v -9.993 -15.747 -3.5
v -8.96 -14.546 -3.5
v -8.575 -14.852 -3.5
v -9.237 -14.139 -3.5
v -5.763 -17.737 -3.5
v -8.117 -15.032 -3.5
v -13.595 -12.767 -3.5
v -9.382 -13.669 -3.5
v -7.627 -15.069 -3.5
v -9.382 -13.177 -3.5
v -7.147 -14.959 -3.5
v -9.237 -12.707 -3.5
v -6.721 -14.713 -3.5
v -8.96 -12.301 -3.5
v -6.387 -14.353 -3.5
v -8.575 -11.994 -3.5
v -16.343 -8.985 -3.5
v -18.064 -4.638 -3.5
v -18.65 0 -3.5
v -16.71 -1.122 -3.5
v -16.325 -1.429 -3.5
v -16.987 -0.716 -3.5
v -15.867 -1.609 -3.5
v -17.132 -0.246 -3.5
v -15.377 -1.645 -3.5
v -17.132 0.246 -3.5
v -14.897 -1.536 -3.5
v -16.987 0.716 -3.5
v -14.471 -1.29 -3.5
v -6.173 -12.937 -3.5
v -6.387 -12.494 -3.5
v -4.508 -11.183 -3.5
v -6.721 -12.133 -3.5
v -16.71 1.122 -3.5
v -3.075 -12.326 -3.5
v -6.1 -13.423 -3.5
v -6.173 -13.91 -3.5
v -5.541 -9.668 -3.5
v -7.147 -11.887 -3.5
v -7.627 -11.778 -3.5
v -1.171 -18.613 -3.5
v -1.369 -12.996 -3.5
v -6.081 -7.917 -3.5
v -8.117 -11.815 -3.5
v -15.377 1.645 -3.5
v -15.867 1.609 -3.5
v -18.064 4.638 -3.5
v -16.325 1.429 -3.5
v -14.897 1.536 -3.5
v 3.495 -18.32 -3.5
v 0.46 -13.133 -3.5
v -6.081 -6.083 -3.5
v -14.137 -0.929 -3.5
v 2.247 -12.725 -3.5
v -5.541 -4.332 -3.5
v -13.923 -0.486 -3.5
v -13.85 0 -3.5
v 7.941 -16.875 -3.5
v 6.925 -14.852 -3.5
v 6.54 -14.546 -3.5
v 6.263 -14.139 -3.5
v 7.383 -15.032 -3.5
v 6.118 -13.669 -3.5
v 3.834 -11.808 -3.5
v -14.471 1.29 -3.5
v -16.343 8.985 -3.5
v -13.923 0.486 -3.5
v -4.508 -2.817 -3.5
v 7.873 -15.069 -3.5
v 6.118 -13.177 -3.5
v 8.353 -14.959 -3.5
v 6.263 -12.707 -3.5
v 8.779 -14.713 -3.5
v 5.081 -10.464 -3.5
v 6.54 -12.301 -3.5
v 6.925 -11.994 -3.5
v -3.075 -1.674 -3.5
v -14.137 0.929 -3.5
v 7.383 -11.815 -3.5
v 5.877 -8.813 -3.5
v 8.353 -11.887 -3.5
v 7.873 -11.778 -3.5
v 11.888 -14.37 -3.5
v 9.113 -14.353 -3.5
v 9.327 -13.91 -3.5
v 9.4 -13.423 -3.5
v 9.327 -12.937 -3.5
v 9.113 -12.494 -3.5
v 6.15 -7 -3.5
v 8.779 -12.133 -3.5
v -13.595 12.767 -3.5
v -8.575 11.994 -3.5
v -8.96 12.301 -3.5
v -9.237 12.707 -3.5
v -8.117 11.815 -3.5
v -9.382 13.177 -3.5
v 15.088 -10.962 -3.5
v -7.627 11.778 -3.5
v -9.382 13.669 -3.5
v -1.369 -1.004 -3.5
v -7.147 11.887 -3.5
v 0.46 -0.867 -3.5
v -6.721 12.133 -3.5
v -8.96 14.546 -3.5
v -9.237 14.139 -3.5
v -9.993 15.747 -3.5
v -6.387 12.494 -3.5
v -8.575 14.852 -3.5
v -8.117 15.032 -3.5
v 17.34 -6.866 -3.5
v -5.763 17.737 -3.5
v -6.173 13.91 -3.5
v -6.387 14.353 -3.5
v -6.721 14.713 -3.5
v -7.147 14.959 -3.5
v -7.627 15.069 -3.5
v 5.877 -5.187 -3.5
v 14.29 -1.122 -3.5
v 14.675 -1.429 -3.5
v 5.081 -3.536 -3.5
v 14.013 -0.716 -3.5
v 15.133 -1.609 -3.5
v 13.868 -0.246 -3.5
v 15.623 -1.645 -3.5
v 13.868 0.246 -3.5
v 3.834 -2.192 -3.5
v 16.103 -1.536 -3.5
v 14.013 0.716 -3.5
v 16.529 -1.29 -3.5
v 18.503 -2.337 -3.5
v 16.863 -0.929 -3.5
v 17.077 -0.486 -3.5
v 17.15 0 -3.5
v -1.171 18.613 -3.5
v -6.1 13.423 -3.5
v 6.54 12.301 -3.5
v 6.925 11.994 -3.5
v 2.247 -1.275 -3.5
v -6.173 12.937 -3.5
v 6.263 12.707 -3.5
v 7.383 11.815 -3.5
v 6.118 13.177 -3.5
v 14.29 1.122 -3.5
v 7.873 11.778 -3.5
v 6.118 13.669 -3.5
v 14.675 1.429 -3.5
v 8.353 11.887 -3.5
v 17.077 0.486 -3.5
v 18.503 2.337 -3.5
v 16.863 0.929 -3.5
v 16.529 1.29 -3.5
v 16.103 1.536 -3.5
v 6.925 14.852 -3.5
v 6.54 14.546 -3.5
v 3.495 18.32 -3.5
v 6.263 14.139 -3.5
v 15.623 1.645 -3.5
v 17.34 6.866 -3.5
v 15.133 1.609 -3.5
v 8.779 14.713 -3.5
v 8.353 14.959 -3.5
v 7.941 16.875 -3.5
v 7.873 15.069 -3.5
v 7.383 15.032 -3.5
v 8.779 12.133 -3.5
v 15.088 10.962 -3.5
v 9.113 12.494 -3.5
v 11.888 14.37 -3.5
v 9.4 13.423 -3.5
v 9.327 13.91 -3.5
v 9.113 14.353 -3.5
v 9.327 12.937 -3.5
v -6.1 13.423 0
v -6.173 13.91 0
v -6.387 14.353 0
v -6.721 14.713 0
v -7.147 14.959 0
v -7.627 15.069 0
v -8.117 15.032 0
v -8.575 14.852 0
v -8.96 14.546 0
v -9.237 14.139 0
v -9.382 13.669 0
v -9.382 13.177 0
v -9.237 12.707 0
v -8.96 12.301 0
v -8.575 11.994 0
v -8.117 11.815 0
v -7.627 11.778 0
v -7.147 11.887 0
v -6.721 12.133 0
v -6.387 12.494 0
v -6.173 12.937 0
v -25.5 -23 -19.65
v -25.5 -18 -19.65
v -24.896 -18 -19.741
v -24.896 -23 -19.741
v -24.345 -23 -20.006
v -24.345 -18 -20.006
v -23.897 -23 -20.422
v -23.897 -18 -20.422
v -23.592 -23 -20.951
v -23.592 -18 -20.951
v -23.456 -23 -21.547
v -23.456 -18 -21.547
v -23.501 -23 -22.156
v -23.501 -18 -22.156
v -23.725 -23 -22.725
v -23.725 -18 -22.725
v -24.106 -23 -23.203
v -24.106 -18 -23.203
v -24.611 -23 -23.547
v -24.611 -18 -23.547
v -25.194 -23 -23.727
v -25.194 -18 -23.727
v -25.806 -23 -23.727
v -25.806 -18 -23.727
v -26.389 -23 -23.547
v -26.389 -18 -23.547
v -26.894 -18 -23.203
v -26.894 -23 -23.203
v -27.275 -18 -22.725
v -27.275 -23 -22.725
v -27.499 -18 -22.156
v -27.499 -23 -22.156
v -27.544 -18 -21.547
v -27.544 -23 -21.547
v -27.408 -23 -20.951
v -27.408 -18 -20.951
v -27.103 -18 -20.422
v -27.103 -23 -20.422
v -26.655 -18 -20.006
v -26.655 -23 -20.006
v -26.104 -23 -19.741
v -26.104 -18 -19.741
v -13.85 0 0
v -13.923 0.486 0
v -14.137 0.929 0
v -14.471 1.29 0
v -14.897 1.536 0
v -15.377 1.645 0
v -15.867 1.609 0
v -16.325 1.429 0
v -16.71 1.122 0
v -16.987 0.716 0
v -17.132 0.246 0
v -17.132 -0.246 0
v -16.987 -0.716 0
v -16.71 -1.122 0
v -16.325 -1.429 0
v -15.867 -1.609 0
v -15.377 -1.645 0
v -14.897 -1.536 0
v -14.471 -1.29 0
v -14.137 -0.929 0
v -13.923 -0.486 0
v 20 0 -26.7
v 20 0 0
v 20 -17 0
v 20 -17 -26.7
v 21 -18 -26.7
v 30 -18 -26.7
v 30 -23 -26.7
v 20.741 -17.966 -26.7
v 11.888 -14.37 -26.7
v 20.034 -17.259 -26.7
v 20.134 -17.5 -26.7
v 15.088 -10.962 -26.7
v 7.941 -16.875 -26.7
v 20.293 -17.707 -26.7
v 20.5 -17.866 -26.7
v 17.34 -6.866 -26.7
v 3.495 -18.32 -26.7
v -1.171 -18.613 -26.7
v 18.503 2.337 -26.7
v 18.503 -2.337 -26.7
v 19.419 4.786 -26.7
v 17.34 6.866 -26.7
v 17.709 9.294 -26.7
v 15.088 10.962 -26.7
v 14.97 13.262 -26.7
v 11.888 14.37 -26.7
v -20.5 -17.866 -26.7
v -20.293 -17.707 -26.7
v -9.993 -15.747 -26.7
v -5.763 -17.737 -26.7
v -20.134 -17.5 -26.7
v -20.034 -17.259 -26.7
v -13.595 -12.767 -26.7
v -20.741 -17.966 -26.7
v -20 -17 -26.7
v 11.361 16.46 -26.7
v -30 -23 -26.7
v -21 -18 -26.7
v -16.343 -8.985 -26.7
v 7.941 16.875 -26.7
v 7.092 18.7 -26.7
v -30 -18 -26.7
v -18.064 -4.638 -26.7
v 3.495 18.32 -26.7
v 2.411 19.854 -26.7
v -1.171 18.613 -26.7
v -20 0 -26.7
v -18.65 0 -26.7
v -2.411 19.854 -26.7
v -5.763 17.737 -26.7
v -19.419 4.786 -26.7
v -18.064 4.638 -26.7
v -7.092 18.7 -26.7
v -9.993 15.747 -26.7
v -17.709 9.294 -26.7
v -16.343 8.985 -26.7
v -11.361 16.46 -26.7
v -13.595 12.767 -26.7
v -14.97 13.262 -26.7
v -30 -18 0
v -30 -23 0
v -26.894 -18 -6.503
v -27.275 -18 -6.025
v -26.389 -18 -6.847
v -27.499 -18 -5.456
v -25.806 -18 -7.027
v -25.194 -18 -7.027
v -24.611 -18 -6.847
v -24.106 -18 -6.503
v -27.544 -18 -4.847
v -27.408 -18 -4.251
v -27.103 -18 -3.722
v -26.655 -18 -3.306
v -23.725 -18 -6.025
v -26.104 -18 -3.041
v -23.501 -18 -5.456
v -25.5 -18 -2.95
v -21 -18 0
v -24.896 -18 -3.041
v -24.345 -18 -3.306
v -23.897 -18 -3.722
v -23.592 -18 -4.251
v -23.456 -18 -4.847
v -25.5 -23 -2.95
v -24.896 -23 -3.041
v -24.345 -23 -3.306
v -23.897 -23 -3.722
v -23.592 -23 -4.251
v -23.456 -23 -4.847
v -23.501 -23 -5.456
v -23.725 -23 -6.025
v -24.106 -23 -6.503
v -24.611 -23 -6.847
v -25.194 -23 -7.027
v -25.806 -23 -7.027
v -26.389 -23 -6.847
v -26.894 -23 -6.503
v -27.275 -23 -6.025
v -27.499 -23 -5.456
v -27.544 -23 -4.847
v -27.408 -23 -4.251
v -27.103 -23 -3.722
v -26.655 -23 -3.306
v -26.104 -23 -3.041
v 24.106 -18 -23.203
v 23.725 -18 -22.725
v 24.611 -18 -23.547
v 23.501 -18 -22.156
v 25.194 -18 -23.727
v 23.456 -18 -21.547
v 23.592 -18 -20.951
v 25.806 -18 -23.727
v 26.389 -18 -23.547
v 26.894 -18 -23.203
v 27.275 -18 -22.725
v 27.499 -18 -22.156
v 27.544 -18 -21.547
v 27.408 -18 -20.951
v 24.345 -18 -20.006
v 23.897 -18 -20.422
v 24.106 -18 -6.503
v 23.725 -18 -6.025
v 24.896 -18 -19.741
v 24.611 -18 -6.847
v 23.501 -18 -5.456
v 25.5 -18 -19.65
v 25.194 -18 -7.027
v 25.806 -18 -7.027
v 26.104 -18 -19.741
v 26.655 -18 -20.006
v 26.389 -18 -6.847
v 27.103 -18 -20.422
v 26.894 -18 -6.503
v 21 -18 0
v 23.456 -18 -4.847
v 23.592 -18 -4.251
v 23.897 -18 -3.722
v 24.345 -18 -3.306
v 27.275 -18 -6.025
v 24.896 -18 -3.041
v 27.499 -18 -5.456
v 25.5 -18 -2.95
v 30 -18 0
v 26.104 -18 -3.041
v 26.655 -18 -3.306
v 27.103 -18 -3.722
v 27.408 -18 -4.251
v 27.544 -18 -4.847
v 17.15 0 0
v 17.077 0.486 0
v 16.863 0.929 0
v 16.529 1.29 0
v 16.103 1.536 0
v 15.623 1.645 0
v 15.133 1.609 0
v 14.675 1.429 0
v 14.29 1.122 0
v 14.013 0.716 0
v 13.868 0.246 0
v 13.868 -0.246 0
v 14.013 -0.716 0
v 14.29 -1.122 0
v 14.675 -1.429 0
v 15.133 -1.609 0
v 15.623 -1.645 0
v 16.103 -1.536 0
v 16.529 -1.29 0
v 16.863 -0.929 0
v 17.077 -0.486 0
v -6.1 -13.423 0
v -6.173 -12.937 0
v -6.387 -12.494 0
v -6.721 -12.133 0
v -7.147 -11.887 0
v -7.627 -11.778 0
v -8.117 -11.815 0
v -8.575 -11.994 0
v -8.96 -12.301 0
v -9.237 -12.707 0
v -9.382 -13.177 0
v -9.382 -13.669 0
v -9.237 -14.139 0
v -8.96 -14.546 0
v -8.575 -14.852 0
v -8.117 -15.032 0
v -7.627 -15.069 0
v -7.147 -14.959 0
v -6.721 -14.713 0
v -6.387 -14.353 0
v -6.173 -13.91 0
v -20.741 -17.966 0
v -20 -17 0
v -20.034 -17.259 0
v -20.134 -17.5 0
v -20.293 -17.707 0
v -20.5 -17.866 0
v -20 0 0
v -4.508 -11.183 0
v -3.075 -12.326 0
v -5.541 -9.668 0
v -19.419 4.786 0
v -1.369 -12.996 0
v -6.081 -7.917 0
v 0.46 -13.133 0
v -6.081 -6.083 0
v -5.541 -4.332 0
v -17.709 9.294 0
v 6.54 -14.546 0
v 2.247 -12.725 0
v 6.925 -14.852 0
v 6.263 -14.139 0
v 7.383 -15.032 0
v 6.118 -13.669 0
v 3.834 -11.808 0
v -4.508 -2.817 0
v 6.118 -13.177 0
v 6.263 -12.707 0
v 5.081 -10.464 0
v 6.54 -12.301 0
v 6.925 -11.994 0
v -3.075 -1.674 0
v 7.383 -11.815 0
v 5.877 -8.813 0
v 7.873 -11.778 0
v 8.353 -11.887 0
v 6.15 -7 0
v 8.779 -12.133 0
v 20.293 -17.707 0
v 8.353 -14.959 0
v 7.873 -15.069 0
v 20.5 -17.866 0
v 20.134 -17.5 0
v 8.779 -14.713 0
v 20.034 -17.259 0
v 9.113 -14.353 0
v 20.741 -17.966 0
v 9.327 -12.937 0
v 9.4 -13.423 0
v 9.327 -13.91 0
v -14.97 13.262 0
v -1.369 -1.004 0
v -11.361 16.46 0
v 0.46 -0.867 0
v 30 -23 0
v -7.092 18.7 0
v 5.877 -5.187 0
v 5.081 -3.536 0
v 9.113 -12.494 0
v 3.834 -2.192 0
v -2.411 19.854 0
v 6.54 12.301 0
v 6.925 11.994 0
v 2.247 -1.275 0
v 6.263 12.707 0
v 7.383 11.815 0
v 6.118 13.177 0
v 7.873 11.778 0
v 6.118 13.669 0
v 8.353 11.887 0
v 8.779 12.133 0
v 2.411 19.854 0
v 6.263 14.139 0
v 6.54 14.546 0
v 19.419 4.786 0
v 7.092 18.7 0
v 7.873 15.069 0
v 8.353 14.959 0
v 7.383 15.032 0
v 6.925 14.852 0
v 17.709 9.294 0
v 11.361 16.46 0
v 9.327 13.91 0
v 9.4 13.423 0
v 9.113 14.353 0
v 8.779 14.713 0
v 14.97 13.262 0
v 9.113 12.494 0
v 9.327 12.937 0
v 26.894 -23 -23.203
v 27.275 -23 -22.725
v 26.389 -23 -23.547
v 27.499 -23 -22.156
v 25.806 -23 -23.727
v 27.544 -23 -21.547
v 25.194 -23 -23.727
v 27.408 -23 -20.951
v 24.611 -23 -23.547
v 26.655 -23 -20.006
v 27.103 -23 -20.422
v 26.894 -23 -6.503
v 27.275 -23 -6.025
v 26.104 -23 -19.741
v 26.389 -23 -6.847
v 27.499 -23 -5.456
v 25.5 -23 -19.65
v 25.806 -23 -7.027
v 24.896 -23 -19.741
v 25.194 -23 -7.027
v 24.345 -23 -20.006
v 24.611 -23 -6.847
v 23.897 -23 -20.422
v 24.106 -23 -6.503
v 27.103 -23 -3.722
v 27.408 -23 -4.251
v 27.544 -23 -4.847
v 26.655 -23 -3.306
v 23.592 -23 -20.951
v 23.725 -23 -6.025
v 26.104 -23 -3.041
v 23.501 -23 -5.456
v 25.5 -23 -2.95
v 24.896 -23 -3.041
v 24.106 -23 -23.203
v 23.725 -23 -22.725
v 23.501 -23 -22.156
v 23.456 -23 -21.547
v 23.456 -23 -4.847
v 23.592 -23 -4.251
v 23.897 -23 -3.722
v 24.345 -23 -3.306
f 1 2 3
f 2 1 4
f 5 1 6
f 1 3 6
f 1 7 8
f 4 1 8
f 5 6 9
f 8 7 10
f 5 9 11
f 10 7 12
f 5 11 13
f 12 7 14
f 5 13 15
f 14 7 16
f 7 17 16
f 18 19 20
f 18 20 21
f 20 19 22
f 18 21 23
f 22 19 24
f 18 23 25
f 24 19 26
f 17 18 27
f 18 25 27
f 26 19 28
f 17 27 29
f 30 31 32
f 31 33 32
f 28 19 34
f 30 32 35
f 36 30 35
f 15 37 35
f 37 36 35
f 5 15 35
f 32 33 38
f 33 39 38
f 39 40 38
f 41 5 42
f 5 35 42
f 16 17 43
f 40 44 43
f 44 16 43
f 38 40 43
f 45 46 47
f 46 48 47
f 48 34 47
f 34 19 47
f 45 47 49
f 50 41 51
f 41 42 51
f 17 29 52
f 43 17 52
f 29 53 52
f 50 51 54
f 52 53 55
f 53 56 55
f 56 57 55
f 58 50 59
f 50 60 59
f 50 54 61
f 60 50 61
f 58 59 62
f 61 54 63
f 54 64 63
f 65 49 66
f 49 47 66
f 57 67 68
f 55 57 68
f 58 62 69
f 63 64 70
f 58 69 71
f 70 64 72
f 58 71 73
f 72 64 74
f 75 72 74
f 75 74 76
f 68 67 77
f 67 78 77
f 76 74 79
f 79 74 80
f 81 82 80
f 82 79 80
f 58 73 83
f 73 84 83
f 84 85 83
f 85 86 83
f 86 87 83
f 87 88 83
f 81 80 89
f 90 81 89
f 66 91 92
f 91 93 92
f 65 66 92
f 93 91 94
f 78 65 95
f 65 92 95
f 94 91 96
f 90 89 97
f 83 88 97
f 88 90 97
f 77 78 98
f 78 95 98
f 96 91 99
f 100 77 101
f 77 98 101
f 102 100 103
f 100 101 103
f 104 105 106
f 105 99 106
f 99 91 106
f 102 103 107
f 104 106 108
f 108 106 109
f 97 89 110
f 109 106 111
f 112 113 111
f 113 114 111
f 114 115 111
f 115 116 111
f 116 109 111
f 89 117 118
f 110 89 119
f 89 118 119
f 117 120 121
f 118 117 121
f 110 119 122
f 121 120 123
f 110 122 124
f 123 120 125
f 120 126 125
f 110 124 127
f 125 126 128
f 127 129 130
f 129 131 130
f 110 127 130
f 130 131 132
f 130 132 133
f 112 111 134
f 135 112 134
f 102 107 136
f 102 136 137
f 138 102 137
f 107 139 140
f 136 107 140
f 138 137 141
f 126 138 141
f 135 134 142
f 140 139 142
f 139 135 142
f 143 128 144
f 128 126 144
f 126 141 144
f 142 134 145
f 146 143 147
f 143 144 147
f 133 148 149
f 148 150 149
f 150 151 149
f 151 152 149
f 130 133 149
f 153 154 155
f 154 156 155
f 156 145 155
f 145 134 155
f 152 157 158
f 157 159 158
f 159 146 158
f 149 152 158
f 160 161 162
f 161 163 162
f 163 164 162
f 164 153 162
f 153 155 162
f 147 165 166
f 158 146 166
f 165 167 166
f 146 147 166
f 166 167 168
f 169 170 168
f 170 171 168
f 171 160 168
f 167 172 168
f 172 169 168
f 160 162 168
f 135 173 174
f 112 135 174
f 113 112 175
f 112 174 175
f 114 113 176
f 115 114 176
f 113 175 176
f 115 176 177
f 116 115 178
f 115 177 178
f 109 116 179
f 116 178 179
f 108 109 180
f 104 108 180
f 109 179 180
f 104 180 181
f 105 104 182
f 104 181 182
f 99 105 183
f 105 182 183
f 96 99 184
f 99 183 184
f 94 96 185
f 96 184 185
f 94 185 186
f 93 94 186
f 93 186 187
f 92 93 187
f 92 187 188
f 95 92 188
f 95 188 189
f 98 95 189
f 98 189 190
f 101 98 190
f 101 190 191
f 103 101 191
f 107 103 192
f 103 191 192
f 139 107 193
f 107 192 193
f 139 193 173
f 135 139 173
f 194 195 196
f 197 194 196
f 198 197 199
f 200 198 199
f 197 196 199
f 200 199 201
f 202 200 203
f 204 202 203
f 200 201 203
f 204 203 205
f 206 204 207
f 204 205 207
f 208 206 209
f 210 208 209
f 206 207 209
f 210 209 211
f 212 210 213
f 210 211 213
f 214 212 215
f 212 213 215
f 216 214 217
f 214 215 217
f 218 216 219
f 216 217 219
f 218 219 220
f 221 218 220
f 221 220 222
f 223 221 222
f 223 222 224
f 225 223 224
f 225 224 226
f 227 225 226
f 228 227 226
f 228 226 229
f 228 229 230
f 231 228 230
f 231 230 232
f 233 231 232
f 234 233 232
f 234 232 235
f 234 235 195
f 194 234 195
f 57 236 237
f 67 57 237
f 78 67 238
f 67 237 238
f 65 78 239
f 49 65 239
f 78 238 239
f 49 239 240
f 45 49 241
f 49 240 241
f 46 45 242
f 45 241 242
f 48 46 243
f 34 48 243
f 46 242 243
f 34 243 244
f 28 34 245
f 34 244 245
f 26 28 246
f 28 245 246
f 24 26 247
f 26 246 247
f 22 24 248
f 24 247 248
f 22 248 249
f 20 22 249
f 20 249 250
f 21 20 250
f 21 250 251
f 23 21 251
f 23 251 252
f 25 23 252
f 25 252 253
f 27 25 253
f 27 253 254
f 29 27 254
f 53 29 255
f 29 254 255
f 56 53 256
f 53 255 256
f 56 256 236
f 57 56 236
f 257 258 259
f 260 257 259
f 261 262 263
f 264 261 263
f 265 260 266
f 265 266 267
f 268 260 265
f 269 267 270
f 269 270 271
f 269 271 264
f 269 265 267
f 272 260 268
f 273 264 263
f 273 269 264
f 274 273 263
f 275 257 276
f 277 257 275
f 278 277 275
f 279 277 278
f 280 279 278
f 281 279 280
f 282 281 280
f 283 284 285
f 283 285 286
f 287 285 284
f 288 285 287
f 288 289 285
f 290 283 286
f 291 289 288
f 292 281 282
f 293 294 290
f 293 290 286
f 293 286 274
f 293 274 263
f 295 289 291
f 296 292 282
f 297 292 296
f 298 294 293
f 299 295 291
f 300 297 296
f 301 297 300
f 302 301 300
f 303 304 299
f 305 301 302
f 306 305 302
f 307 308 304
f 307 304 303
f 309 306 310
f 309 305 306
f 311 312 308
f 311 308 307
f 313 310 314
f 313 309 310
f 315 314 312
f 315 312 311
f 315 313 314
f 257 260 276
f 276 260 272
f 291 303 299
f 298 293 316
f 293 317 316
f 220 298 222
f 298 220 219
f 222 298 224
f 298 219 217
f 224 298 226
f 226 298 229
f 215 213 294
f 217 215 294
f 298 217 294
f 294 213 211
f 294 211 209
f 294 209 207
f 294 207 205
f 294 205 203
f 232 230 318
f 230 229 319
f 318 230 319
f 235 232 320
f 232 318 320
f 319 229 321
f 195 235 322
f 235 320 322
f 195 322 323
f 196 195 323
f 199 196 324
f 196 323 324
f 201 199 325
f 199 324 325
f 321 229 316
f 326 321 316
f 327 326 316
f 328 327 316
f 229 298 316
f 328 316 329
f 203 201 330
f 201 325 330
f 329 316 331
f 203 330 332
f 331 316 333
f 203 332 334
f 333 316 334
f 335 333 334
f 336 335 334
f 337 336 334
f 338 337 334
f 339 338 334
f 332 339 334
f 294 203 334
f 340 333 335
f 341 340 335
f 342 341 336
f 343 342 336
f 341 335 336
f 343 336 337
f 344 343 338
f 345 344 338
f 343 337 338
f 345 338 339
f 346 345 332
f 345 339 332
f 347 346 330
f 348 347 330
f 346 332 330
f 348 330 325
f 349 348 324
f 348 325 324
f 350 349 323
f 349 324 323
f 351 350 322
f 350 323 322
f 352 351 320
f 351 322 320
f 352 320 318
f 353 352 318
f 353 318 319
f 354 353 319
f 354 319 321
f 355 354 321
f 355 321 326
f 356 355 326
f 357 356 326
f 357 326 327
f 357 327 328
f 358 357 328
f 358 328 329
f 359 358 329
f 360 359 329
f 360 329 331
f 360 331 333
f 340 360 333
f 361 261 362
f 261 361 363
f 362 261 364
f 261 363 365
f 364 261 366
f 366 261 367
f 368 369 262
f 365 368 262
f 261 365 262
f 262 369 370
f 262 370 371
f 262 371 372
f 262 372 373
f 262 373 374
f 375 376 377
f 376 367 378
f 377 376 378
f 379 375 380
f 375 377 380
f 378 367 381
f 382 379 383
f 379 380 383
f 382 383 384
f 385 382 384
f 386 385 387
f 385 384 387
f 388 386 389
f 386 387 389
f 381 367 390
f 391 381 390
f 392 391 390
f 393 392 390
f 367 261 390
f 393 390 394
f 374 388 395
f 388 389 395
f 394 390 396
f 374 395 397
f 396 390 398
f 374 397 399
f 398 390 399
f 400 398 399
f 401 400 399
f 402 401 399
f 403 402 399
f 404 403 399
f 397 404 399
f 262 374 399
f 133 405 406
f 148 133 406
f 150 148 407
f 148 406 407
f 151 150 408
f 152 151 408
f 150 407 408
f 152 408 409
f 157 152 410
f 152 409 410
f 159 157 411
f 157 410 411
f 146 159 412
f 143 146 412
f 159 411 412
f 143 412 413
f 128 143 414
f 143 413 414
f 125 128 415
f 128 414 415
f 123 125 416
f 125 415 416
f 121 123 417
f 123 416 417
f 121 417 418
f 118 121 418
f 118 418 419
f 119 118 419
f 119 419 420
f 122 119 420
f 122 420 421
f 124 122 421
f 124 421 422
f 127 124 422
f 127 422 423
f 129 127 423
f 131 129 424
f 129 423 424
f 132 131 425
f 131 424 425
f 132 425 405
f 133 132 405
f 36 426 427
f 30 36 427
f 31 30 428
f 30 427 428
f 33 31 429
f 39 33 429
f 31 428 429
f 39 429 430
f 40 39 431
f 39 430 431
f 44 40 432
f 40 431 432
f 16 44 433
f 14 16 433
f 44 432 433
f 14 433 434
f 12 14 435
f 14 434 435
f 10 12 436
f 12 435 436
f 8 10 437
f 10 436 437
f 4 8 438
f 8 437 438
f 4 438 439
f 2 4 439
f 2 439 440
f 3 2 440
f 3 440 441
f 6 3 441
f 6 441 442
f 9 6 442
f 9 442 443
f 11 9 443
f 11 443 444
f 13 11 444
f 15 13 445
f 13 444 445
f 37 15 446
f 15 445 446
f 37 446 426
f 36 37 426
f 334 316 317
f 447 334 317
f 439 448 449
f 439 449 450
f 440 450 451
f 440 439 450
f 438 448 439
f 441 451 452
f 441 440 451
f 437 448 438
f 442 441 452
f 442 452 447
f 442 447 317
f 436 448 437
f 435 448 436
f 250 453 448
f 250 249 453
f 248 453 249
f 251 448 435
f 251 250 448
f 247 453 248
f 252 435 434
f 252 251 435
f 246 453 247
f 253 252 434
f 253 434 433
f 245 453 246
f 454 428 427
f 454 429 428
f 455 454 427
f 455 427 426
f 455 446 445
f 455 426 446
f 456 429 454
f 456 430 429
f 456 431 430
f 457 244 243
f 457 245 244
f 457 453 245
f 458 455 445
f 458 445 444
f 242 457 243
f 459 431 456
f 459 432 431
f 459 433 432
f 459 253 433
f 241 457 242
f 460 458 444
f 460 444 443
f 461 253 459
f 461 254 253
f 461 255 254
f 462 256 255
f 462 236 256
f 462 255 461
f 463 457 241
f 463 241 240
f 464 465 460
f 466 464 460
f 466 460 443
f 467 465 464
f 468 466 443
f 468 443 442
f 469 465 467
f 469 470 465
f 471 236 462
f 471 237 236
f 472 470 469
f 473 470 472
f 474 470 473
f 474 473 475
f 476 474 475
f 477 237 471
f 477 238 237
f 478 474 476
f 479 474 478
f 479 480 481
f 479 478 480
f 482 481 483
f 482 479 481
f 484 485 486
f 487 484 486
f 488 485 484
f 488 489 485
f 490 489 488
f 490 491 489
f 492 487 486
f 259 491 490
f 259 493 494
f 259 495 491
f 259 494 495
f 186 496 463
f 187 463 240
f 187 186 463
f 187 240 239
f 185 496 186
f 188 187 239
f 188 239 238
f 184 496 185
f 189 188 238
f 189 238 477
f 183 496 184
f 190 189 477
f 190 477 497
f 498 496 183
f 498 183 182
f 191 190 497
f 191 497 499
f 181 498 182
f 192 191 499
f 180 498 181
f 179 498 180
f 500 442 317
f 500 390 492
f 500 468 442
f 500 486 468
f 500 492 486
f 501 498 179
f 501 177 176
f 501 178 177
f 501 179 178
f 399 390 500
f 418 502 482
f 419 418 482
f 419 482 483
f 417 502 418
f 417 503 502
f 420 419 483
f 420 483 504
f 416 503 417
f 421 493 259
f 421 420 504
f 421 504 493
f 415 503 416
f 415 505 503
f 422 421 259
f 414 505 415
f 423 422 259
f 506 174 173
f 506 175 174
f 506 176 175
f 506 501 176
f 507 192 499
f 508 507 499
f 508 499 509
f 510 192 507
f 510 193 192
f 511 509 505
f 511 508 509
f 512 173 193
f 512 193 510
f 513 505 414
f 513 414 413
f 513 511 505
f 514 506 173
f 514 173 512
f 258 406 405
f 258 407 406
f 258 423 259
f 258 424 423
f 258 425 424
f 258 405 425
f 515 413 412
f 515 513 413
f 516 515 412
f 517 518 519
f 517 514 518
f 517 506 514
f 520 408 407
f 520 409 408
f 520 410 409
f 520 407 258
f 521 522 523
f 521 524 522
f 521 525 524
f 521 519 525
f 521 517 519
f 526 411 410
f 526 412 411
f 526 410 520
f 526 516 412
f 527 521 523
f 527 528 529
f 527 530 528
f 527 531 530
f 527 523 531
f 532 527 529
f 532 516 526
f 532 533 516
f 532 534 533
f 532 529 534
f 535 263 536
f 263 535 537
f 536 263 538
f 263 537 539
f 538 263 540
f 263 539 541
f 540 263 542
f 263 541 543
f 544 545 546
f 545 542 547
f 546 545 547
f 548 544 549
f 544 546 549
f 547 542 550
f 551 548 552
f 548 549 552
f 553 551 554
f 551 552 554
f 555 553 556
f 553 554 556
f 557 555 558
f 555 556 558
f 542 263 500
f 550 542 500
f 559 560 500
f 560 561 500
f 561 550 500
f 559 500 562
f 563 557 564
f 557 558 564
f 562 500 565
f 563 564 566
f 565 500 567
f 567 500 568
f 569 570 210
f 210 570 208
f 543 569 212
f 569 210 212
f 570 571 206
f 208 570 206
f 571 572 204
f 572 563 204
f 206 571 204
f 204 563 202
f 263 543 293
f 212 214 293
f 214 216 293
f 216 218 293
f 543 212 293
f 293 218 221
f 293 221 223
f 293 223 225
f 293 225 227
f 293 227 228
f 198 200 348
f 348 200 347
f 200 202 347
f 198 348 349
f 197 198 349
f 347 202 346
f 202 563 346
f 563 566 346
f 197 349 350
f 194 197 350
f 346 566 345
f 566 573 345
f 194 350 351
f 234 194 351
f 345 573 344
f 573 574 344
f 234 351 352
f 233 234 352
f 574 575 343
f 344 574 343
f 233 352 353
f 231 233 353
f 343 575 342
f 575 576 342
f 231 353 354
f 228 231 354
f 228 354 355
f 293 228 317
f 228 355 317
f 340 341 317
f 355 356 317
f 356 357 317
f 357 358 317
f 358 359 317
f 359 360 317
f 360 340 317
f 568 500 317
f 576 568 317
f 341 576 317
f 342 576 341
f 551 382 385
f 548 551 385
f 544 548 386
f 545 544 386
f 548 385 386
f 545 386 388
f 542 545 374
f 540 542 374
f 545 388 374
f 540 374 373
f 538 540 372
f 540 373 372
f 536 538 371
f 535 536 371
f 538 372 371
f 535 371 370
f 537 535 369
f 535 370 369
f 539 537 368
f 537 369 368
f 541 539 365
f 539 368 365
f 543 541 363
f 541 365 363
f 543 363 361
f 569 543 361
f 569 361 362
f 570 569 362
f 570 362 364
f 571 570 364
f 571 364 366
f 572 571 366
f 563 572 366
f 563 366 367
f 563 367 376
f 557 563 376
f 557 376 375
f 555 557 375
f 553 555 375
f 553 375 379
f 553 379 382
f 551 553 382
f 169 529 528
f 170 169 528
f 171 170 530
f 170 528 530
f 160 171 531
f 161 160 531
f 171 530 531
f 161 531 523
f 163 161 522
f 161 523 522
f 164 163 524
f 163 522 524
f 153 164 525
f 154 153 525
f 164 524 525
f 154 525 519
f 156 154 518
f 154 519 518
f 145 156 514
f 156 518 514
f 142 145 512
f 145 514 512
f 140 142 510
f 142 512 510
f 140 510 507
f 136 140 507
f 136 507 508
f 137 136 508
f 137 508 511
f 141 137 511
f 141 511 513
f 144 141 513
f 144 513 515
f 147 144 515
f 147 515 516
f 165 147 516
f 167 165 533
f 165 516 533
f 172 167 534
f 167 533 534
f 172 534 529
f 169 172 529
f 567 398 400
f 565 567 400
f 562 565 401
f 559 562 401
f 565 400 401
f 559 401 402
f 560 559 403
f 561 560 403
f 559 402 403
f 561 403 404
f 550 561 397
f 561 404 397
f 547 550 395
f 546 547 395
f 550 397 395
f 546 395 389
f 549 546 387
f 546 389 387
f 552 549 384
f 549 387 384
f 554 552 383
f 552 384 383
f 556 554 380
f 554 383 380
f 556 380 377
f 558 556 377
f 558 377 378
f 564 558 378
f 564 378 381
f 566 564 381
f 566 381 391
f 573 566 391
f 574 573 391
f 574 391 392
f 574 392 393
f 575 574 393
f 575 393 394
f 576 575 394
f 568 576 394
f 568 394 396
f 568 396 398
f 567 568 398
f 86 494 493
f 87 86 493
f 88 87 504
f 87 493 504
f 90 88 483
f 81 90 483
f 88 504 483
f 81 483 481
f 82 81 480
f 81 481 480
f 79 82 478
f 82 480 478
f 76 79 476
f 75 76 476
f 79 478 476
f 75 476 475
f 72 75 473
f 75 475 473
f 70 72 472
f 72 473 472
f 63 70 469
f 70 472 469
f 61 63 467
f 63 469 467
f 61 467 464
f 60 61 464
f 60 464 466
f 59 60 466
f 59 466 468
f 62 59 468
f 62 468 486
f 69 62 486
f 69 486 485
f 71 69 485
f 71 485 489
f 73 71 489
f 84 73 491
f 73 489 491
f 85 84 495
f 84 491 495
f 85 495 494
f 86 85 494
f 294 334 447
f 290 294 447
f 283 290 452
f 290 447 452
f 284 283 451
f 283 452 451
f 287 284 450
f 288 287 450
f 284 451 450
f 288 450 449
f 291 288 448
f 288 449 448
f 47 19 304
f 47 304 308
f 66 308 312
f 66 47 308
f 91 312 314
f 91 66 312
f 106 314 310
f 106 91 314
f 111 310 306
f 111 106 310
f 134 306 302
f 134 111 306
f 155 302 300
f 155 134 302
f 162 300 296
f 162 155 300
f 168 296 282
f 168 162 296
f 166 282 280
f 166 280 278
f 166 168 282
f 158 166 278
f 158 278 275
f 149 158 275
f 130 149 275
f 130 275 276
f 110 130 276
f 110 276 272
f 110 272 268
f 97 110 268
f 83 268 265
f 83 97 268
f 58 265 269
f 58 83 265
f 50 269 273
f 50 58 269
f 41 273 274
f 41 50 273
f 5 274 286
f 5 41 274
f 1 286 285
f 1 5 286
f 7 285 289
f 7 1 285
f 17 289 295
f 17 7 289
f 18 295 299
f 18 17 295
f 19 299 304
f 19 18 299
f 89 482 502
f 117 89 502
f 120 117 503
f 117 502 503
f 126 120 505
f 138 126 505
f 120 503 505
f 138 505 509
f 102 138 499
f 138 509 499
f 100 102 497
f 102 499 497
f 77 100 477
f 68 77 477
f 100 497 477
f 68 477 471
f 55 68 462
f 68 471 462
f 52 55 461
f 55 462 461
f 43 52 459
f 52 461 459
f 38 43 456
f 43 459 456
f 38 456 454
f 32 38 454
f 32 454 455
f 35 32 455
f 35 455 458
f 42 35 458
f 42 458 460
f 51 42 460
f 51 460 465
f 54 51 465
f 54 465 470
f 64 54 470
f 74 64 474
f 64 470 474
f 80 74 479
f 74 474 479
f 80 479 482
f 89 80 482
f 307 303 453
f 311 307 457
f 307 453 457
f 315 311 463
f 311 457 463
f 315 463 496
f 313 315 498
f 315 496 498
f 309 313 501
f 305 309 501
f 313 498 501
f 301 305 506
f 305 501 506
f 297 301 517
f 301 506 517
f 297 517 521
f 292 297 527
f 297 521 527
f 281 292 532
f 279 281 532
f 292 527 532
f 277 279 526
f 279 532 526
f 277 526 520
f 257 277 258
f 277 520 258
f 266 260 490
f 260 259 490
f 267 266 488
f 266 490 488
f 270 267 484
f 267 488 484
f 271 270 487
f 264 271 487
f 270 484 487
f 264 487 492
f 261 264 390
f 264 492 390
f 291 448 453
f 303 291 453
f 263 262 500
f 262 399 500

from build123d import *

# Parameters (mm, degrees)
ESQUISSE3_R             = 6.15
ESQUISSE3_R_2           = 1.65
BOSS_EXTRU_2_DEPTH      = 3.5
ESQUISSE4_R             = 18.65
BOSS_EXTRU_3_DEPTH      = 23.2
ESQUISSE5_R             = 2.05
ENL_V_MAT_EXTRU_1_DEPTH = 31


with BuildPart() as part:
    # Esquisse3 → Boss.-Extru.2 (new body)
    with BuildSketch(Plane.XY):
        with BuildLine():
            Line((-20, 0), (-20, -17))
            ThreePointArc((-20, -17), (-20.292893219, -17.707106781), (-21, -18))
            Line((-21, -18), (-30, -18))
            Line((-30, -18), (-30, -23))
            Line((-30, -23), (30, -23))
            Line((30, -23), (30, -18))
            Line((30, -18), (21, -18))
            ThreePointArc((21, -18), (20.292893219, -17.707106781), (20, -17))
            Line((20, -17), (20, 0))
            ThreePointArc((20, 0), (0, 20), (-20, 0))
        make_face()
        with Locations((0, -7)):
            Circle(ESQUISSE3_R, mode=Mode.SUBTRACT)
        with Locations((-15.5, 0)):
            Circle(ESQUISSE3_R_2, mode=Mode.SUBTRACT)
        with Locations((-7.75, 13.423393759)):
            Circle(ESQUISSE3_R_2, mode=Mode.SUBTRACT)
        with Locations((7.75, 13.423393759)):
            Circle(ESQUISSE3_R_2, mode=Mode.SUBTRACT)
        with Locations((15.5, 0)):
            Circle(ESQUISSE3_R_2, mode=Mode.SUBTRACT)
        with Locations((7.75, -13.423393759)):
            Circle(ESQUISSE3_R_2, mode=Mode.SUBTRACT)
        with Locations((-7.75, -13.423393759)):
            Circle(ESQUISSE3_R_2, mode=Mode.SUBTRACT)
    extrude(amount=-BOSS_EXTRU_2_DEPTH)

    # Esquisse4 → Boss.-Extru.3 (add)
    with BuildSketch(Plane(origin=(0, 0, -3.5), x_dir=(-1, 0, 0), z_dir=(0, 0, -1))):
        with BuildLine():
            Line((-20, 0), (-20, -17))
            ThreePointArc((-20, -17), (-20.292893219, -17.707106781), (-21, -18))
            Line((-21, -18), (-30, -18))
            Line((-30, -18), (-30, -23))
            Line((-30, -23), (30, -23))
            Line((30, -23), (30, -18))
            Line((30, -18), (21, -18))
            ThreePointArc((21, -18), (20.292893219, -17.707106781), (20, -17))
            Line((20, -17), (20, 0))
            ThreePointArc((20, 0), (0, 20), (-20, 0))
        make_face()
        Circle(ESQUISSE4_R, mode=Mode.SUBTRACT)
    extrude(amount=BOSS_EXTRU_3_DEPTH)

    # Esquisse5 → Enlèv. mat.-Extru.1 (cut)
    with BuildSketch(Plane(origin=(0, 0, 0), x_dir=(1, 0, 0), z_dir=(0, 1, 0))):
        with Locations(Location((-25.5, 21.7, 0), (0, 0, 270))):
            Circle(ESQUISSE5_R)
        with Locations(Location((-25.5, 5, 0), (0, 0, 270))):
            Circle(ESQUISSE5_R)
        with Locations(Location((25.5, 5, 0), (0, 0, 270))):
            Circle(ESQUISSE5_R)
        with Locations(Location((25.5, 21.7, 0), (0, 0, 270))):
            Circle(ESQUISSE5_R)
    extrude(amount=-ENL_V_MAT_EXTRU_1_DEPTH, mode=Mode.SUBTRACT)


solid = part.part
